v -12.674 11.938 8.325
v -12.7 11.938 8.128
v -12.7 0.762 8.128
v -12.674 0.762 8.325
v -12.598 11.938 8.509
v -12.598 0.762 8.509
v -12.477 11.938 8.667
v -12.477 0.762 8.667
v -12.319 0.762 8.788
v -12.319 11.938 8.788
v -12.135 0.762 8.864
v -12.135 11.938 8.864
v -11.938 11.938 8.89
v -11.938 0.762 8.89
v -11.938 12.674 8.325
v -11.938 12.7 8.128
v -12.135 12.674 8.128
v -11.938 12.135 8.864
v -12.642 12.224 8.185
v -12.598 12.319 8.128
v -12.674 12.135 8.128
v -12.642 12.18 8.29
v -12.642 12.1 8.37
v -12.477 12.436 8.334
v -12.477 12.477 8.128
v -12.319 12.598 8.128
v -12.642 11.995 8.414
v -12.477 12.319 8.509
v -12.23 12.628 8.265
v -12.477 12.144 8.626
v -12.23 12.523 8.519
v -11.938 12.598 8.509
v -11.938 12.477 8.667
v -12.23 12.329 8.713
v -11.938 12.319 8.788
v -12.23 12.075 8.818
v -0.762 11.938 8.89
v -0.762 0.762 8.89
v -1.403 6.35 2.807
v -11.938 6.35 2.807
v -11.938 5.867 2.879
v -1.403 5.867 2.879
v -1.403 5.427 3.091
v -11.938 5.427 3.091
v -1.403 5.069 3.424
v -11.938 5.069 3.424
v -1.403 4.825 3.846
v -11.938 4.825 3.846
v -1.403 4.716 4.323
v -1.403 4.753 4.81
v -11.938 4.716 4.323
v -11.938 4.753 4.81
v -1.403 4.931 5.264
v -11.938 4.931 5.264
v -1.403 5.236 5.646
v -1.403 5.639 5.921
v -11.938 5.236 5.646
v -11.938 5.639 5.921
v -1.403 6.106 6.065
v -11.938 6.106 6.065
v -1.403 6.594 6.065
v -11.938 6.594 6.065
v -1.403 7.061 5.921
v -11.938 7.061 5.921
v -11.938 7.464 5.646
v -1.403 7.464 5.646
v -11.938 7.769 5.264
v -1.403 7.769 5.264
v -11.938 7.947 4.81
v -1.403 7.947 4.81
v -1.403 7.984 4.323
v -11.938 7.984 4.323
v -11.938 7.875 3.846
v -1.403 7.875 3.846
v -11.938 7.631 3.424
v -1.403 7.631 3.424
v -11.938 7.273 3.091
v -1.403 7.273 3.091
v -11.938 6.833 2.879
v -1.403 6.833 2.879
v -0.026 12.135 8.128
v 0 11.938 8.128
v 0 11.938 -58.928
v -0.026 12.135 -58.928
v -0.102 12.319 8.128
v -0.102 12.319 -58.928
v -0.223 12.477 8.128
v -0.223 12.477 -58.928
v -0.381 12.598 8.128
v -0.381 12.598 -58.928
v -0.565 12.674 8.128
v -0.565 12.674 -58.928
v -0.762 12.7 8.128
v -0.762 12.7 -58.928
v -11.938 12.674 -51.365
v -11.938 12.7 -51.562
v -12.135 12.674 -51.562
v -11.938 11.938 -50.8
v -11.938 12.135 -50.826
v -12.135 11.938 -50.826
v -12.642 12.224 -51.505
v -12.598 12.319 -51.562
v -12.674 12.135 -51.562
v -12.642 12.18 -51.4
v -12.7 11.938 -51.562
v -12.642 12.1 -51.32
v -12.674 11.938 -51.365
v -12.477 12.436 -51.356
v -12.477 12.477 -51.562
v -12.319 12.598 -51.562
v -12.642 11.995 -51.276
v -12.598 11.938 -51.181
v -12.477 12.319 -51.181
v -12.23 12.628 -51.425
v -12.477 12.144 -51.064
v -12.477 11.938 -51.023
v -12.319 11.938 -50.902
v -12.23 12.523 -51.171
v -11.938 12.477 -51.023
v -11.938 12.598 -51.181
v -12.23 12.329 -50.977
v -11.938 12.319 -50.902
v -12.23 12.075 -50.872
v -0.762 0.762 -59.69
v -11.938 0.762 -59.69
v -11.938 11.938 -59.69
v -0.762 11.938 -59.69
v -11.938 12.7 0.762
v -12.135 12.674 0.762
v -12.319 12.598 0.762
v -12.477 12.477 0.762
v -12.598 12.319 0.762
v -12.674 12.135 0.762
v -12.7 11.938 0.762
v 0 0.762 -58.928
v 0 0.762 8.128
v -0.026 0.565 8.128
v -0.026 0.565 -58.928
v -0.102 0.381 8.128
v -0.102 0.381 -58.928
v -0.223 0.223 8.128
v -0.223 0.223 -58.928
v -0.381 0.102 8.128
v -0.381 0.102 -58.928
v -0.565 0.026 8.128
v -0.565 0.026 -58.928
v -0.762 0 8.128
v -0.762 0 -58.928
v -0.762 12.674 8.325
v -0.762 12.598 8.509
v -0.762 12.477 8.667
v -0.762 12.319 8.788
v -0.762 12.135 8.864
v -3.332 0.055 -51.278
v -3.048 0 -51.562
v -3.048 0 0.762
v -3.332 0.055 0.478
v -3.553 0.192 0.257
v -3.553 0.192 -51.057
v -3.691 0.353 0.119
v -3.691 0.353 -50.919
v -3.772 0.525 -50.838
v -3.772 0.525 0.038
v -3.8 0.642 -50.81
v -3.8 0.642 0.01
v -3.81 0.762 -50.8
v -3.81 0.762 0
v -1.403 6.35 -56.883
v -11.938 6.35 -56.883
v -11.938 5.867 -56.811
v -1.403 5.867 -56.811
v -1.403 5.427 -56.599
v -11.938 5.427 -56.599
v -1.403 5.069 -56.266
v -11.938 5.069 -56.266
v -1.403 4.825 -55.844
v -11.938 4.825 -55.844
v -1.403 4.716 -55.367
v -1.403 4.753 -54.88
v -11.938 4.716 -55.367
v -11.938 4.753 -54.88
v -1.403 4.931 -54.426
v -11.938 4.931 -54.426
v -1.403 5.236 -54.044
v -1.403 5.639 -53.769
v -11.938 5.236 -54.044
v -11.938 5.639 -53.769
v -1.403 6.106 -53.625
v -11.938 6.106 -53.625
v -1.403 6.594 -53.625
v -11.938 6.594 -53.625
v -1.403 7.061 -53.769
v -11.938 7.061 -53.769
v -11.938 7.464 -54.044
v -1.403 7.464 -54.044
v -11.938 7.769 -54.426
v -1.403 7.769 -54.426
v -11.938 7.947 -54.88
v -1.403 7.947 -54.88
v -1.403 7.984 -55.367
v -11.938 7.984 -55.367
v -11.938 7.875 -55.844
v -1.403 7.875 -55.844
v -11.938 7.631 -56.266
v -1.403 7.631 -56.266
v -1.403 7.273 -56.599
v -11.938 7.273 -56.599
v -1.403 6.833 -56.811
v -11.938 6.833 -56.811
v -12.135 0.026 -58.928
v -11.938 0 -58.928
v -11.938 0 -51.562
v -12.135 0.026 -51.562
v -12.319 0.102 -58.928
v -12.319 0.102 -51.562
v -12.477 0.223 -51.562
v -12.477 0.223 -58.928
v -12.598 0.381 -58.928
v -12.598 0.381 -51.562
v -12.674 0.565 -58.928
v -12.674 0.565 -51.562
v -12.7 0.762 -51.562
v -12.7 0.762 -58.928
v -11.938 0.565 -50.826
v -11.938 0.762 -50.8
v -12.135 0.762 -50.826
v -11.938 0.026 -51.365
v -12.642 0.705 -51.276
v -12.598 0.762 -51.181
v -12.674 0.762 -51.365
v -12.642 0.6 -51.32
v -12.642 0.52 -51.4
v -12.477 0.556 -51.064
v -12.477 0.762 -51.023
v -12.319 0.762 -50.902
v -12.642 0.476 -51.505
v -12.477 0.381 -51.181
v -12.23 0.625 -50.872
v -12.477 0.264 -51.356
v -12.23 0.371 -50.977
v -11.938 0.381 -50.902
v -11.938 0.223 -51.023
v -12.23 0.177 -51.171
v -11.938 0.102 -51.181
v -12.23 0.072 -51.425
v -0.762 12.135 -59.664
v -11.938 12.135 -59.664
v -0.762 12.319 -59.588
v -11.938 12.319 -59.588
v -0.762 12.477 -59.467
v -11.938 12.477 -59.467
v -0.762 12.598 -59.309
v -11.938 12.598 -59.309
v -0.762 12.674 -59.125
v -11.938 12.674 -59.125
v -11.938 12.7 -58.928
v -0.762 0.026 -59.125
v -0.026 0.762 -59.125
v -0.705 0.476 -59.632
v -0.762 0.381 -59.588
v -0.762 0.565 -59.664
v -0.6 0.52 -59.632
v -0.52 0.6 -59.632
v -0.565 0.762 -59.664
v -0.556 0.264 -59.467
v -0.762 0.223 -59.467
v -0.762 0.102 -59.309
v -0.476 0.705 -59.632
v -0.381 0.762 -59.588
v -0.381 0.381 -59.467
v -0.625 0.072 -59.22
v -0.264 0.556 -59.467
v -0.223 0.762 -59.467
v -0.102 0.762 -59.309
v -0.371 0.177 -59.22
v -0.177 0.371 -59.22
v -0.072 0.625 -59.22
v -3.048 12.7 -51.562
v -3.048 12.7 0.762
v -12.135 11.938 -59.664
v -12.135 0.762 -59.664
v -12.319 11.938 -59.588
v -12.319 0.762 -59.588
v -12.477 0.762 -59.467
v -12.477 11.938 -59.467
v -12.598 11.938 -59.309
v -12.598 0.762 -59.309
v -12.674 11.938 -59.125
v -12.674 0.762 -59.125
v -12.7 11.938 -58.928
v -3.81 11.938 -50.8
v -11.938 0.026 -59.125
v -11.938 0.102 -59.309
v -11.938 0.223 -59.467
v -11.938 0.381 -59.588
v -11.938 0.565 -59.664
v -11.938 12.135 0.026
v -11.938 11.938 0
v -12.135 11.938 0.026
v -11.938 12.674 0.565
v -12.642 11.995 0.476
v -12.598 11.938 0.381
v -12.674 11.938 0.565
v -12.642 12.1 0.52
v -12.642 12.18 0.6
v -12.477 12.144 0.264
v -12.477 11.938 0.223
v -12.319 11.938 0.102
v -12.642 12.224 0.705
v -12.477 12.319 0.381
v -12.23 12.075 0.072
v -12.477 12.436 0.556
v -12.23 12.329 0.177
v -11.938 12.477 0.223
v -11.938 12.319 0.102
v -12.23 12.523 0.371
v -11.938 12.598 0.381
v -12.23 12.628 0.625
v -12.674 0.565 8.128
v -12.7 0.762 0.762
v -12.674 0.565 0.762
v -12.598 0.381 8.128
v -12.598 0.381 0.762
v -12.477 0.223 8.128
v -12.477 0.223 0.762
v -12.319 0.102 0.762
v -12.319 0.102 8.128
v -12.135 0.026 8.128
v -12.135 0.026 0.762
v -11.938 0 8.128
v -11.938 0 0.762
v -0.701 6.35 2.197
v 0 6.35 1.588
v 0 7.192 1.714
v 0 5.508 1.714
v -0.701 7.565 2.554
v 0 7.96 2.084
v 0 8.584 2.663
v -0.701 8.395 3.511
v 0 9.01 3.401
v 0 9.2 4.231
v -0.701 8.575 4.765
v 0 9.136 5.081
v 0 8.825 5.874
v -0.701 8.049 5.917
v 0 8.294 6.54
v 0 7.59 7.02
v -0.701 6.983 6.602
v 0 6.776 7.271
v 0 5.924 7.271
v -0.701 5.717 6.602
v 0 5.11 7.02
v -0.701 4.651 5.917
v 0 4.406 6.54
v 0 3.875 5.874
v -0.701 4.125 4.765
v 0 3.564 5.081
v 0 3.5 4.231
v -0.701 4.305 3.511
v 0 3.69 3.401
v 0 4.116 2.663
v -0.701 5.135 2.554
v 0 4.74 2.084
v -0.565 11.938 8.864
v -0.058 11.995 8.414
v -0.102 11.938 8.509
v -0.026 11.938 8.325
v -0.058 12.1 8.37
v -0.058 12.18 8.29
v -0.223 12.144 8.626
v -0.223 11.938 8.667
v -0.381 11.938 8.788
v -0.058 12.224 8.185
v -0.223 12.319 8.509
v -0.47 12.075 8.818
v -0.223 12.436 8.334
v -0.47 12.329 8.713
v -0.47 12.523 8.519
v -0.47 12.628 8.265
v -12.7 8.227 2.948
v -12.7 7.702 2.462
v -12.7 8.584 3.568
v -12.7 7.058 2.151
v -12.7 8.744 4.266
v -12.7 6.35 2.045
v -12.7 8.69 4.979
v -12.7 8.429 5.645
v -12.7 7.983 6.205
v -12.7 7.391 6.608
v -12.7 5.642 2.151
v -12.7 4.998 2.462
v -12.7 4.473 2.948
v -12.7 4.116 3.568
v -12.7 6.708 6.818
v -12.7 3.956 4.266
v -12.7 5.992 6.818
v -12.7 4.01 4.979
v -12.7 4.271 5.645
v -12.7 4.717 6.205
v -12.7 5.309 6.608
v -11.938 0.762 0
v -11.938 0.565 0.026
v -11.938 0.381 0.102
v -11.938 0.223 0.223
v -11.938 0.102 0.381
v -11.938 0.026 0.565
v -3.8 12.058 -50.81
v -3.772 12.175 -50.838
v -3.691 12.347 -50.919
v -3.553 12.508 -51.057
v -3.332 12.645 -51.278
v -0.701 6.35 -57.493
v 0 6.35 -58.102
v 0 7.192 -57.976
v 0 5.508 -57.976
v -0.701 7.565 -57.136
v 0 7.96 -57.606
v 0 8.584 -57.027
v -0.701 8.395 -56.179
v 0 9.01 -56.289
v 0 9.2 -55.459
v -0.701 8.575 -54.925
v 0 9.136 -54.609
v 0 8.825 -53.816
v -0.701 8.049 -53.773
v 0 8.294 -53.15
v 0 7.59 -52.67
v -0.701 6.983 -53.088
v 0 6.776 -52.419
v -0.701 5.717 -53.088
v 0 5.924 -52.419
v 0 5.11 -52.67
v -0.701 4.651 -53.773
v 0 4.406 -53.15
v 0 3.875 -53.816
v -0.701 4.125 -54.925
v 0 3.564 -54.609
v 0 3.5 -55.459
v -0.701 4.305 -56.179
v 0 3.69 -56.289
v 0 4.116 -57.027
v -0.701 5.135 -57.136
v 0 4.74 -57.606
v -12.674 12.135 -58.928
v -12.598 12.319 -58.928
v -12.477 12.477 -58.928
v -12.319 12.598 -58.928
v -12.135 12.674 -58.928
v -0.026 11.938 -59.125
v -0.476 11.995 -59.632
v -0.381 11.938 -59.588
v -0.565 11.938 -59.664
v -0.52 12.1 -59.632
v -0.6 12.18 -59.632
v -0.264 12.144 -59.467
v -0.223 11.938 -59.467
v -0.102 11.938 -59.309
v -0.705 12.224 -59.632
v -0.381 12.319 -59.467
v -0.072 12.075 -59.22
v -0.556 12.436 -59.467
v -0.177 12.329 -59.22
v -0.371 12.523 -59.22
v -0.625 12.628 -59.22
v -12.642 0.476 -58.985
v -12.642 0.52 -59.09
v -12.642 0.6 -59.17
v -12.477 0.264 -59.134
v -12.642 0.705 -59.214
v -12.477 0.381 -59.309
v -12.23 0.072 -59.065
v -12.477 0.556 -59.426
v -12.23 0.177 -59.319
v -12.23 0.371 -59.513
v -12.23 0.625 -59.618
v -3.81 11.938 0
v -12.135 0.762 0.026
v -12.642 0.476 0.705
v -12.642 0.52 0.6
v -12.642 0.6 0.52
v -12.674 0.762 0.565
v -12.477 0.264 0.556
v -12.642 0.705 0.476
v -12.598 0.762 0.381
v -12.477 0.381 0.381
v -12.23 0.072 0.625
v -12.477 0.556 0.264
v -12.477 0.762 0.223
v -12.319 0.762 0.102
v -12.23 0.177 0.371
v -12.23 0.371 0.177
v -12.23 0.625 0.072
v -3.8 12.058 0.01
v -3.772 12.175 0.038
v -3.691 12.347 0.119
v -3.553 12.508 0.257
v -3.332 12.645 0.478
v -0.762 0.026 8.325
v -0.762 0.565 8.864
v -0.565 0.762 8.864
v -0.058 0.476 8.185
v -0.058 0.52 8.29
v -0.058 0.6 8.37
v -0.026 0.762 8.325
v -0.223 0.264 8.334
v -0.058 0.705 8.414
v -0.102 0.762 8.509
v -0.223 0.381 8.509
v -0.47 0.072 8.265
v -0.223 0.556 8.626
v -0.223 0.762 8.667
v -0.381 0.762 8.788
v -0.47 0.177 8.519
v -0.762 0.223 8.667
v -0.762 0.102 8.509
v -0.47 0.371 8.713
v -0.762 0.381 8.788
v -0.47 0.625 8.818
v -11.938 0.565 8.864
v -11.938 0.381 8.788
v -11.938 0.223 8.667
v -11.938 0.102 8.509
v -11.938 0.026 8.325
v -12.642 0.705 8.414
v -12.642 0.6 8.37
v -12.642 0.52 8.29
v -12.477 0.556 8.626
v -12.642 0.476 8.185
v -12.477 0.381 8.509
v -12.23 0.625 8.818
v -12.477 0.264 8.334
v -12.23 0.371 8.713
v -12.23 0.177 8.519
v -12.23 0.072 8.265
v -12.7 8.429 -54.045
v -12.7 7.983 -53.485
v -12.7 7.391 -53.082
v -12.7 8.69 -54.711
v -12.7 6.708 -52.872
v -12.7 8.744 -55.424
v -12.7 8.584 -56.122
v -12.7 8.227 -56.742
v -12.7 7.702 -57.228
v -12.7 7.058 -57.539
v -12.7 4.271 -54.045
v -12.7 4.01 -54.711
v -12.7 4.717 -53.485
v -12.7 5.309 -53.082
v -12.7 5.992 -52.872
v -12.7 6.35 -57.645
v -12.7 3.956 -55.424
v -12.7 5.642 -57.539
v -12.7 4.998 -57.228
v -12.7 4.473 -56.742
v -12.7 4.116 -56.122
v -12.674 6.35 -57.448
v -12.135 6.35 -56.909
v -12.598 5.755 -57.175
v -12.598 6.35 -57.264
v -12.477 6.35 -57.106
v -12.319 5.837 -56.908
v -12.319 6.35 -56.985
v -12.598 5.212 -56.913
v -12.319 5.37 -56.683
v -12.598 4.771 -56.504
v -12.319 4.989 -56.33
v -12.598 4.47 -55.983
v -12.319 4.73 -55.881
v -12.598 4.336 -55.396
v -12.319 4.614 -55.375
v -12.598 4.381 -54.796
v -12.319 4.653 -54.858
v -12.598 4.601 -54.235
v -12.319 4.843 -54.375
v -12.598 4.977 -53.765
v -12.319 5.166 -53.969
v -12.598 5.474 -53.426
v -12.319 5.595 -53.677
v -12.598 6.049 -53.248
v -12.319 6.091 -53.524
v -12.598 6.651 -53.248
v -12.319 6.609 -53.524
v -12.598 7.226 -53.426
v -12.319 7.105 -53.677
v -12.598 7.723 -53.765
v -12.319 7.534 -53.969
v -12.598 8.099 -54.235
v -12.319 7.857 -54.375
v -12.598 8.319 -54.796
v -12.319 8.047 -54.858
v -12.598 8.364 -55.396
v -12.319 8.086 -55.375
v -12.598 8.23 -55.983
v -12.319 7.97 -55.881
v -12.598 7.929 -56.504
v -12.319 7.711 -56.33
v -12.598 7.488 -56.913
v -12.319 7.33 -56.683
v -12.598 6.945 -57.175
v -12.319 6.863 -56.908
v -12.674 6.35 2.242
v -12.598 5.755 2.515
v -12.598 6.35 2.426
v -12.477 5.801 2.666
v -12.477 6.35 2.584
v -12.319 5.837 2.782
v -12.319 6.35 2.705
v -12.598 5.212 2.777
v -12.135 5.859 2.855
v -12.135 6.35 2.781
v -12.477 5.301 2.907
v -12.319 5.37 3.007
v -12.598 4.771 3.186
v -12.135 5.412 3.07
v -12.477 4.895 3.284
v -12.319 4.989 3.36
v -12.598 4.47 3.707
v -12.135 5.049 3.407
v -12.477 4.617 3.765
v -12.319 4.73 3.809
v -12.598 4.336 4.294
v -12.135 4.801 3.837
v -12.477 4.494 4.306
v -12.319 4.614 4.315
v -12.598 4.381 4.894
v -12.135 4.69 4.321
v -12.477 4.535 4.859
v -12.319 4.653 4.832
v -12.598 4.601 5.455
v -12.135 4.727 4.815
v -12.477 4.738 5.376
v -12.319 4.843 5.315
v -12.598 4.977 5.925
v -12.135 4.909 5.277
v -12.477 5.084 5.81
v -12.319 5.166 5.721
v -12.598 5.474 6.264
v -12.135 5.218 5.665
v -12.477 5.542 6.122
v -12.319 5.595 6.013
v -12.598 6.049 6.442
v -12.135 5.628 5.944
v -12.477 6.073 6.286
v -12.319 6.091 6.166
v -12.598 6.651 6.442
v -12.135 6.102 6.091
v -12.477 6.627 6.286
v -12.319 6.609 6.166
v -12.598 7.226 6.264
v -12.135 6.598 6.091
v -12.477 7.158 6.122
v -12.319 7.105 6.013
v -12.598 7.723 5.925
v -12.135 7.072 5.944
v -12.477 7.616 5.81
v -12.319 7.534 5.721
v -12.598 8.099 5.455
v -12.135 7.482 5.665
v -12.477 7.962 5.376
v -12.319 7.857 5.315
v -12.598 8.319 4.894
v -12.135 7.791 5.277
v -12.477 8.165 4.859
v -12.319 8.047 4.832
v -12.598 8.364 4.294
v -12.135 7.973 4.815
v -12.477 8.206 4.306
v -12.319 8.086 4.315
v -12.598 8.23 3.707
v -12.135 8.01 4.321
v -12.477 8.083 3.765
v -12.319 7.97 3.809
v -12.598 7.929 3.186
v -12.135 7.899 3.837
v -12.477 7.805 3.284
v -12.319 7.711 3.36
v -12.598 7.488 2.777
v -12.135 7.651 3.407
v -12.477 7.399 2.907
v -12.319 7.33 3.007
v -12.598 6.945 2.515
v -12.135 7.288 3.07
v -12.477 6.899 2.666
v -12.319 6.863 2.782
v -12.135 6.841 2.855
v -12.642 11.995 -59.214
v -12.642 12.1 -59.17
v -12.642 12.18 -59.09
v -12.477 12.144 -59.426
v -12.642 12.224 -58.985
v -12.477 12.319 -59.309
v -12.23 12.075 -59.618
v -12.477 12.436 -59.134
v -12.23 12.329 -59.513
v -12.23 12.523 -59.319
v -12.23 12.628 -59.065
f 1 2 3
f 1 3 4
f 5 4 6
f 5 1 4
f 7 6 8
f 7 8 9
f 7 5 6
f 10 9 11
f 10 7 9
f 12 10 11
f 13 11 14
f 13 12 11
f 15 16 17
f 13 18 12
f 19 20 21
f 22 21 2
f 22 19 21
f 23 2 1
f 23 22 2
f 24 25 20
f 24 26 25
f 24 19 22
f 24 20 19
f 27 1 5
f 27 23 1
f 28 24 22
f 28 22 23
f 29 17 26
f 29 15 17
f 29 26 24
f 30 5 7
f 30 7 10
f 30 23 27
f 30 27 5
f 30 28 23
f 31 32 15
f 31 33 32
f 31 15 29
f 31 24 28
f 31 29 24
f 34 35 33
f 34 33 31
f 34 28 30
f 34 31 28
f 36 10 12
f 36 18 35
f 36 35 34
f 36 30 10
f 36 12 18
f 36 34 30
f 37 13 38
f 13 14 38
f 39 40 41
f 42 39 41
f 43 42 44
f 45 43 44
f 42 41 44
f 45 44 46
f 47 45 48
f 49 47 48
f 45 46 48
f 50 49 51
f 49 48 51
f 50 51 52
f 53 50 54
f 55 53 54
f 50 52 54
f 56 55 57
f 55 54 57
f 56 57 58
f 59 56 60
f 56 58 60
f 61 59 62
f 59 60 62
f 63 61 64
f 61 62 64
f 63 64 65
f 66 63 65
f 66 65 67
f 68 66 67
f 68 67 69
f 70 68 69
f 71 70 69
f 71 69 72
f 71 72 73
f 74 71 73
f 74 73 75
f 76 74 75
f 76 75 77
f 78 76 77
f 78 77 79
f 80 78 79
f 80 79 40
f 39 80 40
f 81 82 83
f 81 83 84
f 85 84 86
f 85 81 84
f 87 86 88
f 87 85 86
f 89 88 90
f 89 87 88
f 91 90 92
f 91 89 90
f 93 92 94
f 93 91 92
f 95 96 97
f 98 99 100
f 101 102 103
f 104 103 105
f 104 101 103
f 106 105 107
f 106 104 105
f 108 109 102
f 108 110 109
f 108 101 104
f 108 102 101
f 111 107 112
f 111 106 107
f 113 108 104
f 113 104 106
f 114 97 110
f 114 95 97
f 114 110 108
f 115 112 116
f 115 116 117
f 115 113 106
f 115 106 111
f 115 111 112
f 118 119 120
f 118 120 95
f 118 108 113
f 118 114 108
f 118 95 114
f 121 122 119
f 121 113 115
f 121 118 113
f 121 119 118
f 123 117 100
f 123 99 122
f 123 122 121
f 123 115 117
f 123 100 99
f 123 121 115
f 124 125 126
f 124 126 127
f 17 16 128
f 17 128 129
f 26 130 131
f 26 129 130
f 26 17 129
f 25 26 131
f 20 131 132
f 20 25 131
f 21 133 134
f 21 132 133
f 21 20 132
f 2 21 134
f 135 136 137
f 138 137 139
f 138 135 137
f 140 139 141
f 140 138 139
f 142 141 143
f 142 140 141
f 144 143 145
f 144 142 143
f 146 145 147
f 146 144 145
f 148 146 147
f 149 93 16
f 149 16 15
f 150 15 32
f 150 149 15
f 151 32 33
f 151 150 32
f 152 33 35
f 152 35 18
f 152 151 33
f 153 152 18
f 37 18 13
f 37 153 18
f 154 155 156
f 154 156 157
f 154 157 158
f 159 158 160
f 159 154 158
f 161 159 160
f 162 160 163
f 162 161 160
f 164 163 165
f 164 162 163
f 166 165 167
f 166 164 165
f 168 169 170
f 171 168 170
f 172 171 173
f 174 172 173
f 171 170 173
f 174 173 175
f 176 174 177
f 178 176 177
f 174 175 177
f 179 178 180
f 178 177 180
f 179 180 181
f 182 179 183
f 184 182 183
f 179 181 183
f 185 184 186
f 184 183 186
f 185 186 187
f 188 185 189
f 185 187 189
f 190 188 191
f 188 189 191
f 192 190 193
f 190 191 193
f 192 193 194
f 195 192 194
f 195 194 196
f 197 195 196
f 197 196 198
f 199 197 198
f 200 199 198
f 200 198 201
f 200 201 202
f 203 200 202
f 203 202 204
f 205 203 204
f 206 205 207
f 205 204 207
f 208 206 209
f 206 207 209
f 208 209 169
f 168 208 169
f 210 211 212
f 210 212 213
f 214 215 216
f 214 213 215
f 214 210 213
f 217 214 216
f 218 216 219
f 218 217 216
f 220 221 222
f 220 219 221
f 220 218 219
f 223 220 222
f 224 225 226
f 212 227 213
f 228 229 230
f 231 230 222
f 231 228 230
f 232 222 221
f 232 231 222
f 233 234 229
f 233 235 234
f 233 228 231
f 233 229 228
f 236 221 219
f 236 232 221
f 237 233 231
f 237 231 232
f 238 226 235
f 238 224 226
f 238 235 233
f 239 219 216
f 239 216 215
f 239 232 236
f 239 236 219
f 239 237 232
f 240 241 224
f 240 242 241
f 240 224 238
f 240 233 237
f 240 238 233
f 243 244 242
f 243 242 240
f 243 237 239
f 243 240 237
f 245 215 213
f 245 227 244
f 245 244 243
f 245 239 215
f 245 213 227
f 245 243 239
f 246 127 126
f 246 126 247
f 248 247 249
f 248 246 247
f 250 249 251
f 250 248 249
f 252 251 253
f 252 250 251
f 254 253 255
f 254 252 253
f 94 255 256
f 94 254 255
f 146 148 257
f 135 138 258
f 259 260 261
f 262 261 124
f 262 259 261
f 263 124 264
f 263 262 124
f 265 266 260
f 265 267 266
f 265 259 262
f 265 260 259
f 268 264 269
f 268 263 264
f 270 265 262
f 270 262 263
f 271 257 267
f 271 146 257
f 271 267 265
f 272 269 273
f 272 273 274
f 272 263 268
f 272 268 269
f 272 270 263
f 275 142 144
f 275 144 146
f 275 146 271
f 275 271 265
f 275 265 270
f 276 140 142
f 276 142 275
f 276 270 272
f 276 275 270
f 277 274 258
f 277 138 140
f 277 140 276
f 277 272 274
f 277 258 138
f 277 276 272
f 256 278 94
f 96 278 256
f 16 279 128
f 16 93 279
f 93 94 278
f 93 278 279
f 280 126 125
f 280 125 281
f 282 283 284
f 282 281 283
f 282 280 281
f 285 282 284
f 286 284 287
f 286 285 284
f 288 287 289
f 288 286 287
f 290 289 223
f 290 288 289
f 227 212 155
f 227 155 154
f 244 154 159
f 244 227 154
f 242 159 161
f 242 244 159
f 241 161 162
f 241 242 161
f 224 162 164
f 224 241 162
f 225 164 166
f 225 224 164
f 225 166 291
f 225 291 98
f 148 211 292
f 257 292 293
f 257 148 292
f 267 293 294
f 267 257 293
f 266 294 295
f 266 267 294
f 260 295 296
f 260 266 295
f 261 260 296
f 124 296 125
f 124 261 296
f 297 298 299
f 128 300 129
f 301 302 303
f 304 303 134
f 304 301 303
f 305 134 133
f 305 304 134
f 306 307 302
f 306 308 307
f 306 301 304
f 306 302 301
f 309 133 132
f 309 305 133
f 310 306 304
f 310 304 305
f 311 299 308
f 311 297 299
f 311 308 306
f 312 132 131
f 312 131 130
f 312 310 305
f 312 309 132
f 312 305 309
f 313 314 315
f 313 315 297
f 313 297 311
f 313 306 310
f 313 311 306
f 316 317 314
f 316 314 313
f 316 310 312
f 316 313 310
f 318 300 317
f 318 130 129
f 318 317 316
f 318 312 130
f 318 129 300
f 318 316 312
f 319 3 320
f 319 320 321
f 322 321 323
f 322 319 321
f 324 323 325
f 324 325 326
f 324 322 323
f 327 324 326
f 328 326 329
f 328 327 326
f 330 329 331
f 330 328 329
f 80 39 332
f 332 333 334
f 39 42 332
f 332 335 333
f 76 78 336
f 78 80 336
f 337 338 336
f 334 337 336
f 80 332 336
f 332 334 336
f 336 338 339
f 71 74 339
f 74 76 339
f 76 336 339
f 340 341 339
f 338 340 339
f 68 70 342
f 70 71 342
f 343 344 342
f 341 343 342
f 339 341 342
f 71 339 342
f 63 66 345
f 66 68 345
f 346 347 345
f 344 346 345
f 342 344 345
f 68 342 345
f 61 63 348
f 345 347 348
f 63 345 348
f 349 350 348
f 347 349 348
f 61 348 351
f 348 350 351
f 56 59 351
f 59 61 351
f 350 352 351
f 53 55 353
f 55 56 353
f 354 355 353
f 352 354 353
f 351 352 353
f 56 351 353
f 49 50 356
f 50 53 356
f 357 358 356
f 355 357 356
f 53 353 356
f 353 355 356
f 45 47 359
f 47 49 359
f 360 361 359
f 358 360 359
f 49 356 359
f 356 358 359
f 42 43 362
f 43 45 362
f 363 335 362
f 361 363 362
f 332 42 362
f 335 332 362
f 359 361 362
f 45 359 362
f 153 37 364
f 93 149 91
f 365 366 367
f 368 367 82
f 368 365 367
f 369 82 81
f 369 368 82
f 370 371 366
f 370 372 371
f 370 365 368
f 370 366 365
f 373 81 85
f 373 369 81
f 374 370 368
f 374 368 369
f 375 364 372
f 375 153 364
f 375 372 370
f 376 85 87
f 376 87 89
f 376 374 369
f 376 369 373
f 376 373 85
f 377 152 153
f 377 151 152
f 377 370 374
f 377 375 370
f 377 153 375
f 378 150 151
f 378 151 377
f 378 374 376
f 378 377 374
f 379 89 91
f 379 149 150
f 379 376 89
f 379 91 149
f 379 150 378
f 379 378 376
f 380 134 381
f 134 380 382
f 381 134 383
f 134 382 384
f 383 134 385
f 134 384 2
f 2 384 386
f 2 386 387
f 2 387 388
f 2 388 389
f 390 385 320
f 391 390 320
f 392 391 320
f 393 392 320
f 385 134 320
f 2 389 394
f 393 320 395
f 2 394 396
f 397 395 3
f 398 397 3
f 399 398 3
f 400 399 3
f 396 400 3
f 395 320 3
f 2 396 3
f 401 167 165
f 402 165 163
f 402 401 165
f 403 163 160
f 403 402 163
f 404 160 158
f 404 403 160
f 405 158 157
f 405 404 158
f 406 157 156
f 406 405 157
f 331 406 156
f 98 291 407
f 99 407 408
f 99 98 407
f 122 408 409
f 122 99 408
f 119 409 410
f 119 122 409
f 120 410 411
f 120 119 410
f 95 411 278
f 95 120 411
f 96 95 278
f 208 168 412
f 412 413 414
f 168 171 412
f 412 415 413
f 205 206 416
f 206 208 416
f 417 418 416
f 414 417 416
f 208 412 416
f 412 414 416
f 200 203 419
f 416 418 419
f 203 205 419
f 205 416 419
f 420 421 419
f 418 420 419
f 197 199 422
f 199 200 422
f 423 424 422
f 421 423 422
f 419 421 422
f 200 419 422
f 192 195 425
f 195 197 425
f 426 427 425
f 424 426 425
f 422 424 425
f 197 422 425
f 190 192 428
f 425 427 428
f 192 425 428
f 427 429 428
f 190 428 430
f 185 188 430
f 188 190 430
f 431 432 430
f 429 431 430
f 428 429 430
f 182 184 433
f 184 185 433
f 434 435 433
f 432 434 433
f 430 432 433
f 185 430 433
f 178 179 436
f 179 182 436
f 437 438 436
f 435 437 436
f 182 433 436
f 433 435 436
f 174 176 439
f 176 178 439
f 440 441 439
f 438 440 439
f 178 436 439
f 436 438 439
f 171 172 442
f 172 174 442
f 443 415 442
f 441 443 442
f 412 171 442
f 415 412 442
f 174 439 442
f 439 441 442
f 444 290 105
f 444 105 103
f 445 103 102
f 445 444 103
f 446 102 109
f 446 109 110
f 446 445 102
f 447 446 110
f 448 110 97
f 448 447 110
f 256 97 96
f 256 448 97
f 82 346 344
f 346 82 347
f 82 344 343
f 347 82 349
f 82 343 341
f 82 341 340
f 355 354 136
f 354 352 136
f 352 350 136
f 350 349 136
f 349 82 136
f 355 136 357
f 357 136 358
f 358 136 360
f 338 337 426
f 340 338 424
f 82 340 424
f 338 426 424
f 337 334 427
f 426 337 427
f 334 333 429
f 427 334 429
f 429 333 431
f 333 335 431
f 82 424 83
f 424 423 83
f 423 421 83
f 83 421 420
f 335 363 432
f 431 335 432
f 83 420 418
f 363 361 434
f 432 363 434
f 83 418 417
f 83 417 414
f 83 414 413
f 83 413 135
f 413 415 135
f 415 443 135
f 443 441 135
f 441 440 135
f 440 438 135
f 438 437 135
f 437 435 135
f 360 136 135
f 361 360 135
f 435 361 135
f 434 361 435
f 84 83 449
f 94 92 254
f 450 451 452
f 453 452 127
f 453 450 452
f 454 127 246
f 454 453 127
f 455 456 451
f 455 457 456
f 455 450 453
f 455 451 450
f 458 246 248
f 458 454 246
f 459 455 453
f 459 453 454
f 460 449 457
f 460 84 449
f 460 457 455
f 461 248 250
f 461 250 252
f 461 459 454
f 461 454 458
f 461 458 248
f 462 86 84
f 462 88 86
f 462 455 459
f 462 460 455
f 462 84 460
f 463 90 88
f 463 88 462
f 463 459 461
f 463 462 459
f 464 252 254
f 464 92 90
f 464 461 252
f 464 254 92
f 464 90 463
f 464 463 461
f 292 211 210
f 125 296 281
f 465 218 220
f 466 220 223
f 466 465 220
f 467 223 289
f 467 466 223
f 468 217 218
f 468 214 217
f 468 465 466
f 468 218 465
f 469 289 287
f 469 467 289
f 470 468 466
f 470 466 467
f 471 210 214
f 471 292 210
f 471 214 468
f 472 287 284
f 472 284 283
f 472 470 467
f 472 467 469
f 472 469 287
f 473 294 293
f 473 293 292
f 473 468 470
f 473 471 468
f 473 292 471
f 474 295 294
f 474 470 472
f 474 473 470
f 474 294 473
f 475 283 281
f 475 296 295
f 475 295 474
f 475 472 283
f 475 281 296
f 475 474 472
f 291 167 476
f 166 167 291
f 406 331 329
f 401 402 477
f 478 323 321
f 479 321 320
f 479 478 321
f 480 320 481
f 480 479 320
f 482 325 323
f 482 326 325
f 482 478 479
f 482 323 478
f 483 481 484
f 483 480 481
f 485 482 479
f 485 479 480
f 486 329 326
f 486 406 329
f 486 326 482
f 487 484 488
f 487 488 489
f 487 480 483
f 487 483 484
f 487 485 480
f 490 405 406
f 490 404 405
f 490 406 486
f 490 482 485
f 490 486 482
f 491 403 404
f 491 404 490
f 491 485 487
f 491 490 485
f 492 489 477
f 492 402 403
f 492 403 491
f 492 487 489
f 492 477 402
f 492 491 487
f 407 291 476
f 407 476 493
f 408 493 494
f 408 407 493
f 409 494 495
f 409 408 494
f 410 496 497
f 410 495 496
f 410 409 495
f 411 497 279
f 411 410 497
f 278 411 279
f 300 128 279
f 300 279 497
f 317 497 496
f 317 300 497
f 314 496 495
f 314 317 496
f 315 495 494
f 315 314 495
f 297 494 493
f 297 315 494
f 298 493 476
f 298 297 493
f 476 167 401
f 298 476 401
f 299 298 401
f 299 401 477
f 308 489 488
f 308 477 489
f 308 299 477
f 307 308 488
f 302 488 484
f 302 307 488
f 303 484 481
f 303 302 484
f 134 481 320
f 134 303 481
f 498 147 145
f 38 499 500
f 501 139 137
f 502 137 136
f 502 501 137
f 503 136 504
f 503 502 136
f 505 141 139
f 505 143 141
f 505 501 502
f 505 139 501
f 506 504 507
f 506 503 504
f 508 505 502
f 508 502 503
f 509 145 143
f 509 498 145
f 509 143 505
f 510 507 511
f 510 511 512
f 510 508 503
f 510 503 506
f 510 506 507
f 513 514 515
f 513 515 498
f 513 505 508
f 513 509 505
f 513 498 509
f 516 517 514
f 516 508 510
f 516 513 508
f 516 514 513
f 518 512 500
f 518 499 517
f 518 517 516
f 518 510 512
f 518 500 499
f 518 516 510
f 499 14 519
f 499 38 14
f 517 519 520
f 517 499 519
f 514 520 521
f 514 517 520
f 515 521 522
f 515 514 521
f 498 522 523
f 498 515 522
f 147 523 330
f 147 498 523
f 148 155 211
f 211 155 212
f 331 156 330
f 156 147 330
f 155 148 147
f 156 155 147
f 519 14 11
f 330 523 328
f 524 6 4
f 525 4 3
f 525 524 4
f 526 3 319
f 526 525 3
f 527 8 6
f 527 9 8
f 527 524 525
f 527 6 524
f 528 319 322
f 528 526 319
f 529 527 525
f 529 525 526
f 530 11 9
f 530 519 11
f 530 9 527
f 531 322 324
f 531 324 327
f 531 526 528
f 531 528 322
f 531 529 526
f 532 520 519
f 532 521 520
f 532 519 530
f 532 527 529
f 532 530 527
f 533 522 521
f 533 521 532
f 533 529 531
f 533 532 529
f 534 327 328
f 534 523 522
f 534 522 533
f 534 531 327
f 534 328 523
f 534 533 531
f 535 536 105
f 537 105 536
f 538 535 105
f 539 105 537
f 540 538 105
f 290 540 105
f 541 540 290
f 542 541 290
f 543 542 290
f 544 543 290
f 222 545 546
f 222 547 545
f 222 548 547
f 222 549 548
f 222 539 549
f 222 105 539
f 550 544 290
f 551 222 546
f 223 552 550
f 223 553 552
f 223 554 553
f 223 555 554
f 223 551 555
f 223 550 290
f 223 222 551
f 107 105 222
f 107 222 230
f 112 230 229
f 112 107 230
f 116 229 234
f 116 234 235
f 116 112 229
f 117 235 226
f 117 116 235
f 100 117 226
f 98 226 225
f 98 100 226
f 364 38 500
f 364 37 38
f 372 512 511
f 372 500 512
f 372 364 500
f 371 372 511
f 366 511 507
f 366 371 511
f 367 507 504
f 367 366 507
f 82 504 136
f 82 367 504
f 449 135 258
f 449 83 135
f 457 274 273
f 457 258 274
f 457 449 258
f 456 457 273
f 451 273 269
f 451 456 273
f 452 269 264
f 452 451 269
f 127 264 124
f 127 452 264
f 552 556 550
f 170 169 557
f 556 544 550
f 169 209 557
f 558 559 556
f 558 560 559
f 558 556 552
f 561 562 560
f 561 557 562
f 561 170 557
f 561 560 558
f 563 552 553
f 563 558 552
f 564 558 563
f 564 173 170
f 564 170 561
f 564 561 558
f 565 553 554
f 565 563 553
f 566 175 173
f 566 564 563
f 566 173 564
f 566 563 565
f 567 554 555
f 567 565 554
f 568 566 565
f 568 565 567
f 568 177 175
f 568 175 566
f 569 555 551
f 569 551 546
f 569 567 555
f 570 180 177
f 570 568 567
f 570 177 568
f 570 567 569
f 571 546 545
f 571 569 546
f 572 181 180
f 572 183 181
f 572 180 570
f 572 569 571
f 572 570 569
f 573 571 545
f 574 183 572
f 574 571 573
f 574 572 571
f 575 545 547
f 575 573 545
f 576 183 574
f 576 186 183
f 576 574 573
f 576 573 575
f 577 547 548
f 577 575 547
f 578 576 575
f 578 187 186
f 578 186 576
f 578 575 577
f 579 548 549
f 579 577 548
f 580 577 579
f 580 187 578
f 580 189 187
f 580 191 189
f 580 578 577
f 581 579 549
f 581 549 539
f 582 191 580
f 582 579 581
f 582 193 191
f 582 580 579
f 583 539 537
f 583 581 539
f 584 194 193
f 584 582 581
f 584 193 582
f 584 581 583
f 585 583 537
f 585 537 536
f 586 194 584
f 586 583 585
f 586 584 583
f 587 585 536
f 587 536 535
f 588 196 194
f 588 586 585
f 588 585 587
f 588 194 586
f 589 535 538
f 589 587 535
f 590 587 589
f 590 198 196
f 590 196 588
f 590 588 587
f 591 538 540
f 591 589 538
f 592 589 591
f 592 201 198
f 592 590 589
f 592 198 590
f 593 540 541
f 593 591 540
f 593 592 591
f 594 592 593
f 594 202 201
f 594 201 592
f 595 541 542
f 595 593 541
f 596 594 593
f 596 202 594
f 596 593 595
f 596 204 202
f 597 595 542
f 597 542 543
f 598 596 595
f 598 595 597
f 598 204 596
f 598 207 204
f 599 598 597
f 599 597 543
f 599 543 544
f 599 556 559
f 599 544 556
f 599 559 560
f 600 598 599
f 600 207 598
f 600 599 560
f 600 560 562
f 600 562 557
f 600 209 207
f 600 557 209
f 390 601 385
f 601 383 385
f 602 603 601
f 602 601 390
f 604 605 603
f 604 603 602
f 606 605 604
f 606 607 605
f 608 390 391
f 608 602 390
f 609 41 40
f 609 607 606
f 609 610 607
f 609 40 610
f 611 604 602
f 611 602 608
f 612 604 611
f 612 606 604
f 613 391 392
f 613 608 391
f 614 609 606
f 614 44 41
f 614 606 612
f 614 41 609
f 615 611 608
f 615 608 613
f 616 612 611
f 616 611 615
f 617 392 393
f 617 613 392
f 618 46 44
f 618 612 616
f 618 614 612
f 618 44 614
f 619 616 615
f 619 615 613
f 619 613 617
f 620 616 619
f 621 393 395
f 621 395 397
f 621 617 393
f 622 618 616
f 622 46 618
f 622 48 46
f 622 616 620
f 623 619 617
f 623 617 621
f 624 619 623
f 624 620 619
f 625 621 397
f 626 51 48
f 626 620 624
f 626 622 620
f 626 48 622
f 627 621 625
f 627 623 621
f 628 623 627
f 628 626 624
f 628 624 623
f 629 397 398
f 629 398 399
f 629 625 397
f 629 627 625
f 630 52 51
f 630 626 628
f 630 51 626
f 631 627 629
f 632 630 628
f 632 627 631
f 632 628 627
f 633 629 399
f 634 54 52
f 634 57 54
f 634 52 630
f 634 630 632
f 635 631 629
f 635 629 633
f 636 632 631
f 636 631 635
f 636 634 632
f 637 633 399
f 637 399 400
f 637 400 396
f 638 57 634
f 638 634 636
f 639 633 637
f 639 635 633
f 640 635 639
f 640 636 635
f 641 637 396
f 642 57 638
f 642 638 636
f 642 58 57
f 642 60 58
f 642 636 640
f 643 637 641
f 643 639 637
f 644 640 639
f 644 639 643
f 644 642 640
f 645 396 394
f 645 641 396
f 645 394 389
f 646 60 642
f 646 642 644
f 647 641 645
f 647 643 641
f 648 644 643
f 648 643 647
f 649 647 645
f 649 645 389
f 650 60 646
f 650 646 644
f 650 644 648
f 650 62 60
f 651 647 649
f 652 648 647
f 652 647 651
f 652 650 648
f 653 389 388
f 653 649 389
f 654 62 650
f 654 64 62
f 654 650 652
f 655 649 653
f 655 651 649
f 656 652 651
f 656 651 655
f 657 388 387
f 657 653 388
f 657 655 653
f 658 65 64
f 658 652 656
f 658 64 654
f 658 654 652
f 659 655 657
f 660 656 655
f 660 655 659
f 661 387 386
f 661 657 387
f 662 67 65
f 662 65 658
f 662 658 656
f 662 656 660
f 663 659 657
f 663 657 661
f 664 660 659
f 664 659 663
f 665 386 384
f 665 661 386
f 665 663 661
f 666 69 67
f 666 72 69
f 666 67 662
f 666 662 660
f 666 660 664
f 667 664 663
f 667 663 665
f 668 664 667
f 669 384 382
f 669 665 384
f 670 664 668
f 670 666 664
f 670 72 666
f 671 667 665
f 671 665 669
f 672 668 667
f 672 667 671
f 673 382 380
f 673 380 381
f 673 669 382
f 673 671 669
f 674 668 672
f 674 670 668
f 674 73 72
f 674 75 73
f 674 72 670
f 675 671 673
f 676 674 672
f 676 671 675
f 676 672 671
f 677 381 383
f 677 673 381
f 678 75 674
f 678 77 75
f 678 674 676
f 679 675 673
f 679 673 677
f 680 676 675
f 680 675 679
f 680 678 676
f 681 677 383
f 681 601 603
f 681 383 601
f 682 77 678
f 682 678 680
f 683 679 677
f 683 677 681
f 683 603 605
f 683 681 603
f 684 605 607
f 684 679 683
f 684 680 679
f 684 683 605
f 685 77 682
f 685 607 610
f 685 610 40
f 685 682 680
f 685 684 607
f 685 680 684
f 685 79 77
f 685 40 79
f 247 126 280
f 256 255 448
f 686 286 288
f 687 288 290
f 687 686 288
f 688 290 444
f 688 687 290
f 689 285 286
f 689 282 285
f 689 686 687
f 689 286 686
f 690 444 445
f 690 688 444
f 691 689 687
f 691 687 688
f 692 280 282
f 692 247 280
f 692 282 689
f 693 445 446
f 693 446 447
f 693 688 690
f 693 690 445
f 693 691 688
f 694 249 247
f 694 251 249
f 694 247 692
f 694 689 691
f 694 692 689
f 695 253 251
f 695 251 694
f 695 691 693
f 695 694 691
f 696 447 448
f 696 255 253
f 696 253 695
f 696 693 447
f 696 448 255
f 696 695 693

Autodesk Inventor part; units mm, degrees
ref_plane "YZ Plane" through (0, 0, 0) normal (1, 0, 0) x (0, 1, 0)
ref_plane "XZ Plane" through (0, 0, 0) normal (0, 1, 0) x (-1, 0, 0)
ref_plane "XY Plane" through (0, 0, 0) normal (0, 0, 1) x (1, 0, 0)
sketch "Sketch1" plane through (0, 0, 0) normal (0, 1, 0) x (-1, 0, 0)
  line L0 (0, 0) -> (3.81, 0)
  line L1 (3.81, 0) -> (3.81, -50.8)
  line L2 (3.81, -50.8) -> (0, -50.8)
  line L3 (0, -50.8) -> (0, 0)
  line L4 (0, 0) -> (12.7, 0)
  line L5 (12.7, 0) -> (12.7, 8.89)
  line L6 (12.7, 8.89) -> (0, 8.89)
  line L7 (0, 8.89) -> (0, 0)
  line L8 (0, -50.8) -> (12.7, -50.8)
  line L9 (12.7, -50.8) -> (12.7, -59.69)
  line L10 (12.7, -59.69) -> (0, -59.69)
  line L11 (0, -59.69) -> (0, -50.8)
  dimension "d0" = 3.81
  dimension "d1" = 50.8
  dimension "d2" = 12.7
  dimension "d3" = 8.89
  dimension "d4" = 12.7
  dimension "d5" = 8.89
extrude "Extrusion1" add sketch "Sketch1" along normal blind 12.7
sketch "Sketch2" plane through (0, 0, 8.89) normal (1, 0, 0) x (0, 0, -1)
  line L0 (0, 12.7) -> (68.58, 12.7) construction
  line L1 (8.89, 0) -> (0, 0) construction
  line L2 (0, 0) -> (0, 12.7) construction
  line L3 (0, 12.7) -> (8.89, 12.7) construction
  line L4 (8.89, 12.7) -> (8.89, 0) construction
  line L5 (34.29, 12.7) -> (34.29, 0) construction
  line L6 (59.69, 0) -> (8.89, 0) construction
  point P0 (4.445, 6.35)
  point P1 (64.135, 6.35)
hole "Hole1" at (0, 6.35, 4.445) at (0, 6.35, -55.245) direction (-1, 0, 0) diameter 3.2766 end through all countersink diameter 5.715 countersink angle 82 clearance for "Flat Head Machine Screw (82)" size "#4" standard "Ansi Unified Screw Threads"
fillet "Fillet1" radius 0.762 24 edges at (-6.35, 12.7, 8.89) (-6.35, 0, 8.89) (0, 6.35, 8.89) (0, 12.7, -25.4) (0, 0, -25.4) (0, 6.35, -59.69) (-8.255, 12.7, 0) (-3.81, 12.7, -25.4) (-8.255, 12.7, -50.8) (-12.7, 12.7, 4.445) (-12.7, 6.35, 8.89) (-6.35, 12.7, -59.69) (-6.35, 0, -59.69) (-8.255, 0, -50.8) (-8.255, 0, 0) (-3.81, 0, -25.4) (-12.7, 6.35, -50.8) (-12.7, 6.35, -59.69) (-12.7, 6.35, -53.6067) (-12.7, 12.7, -55.245) (-12.7, 0, -55.245) (-12.7, 0, 4.445) (-12.7, 6.35, 0) (-12.7, 6.35, 6.0833)
properties part number "PMSretainer"
